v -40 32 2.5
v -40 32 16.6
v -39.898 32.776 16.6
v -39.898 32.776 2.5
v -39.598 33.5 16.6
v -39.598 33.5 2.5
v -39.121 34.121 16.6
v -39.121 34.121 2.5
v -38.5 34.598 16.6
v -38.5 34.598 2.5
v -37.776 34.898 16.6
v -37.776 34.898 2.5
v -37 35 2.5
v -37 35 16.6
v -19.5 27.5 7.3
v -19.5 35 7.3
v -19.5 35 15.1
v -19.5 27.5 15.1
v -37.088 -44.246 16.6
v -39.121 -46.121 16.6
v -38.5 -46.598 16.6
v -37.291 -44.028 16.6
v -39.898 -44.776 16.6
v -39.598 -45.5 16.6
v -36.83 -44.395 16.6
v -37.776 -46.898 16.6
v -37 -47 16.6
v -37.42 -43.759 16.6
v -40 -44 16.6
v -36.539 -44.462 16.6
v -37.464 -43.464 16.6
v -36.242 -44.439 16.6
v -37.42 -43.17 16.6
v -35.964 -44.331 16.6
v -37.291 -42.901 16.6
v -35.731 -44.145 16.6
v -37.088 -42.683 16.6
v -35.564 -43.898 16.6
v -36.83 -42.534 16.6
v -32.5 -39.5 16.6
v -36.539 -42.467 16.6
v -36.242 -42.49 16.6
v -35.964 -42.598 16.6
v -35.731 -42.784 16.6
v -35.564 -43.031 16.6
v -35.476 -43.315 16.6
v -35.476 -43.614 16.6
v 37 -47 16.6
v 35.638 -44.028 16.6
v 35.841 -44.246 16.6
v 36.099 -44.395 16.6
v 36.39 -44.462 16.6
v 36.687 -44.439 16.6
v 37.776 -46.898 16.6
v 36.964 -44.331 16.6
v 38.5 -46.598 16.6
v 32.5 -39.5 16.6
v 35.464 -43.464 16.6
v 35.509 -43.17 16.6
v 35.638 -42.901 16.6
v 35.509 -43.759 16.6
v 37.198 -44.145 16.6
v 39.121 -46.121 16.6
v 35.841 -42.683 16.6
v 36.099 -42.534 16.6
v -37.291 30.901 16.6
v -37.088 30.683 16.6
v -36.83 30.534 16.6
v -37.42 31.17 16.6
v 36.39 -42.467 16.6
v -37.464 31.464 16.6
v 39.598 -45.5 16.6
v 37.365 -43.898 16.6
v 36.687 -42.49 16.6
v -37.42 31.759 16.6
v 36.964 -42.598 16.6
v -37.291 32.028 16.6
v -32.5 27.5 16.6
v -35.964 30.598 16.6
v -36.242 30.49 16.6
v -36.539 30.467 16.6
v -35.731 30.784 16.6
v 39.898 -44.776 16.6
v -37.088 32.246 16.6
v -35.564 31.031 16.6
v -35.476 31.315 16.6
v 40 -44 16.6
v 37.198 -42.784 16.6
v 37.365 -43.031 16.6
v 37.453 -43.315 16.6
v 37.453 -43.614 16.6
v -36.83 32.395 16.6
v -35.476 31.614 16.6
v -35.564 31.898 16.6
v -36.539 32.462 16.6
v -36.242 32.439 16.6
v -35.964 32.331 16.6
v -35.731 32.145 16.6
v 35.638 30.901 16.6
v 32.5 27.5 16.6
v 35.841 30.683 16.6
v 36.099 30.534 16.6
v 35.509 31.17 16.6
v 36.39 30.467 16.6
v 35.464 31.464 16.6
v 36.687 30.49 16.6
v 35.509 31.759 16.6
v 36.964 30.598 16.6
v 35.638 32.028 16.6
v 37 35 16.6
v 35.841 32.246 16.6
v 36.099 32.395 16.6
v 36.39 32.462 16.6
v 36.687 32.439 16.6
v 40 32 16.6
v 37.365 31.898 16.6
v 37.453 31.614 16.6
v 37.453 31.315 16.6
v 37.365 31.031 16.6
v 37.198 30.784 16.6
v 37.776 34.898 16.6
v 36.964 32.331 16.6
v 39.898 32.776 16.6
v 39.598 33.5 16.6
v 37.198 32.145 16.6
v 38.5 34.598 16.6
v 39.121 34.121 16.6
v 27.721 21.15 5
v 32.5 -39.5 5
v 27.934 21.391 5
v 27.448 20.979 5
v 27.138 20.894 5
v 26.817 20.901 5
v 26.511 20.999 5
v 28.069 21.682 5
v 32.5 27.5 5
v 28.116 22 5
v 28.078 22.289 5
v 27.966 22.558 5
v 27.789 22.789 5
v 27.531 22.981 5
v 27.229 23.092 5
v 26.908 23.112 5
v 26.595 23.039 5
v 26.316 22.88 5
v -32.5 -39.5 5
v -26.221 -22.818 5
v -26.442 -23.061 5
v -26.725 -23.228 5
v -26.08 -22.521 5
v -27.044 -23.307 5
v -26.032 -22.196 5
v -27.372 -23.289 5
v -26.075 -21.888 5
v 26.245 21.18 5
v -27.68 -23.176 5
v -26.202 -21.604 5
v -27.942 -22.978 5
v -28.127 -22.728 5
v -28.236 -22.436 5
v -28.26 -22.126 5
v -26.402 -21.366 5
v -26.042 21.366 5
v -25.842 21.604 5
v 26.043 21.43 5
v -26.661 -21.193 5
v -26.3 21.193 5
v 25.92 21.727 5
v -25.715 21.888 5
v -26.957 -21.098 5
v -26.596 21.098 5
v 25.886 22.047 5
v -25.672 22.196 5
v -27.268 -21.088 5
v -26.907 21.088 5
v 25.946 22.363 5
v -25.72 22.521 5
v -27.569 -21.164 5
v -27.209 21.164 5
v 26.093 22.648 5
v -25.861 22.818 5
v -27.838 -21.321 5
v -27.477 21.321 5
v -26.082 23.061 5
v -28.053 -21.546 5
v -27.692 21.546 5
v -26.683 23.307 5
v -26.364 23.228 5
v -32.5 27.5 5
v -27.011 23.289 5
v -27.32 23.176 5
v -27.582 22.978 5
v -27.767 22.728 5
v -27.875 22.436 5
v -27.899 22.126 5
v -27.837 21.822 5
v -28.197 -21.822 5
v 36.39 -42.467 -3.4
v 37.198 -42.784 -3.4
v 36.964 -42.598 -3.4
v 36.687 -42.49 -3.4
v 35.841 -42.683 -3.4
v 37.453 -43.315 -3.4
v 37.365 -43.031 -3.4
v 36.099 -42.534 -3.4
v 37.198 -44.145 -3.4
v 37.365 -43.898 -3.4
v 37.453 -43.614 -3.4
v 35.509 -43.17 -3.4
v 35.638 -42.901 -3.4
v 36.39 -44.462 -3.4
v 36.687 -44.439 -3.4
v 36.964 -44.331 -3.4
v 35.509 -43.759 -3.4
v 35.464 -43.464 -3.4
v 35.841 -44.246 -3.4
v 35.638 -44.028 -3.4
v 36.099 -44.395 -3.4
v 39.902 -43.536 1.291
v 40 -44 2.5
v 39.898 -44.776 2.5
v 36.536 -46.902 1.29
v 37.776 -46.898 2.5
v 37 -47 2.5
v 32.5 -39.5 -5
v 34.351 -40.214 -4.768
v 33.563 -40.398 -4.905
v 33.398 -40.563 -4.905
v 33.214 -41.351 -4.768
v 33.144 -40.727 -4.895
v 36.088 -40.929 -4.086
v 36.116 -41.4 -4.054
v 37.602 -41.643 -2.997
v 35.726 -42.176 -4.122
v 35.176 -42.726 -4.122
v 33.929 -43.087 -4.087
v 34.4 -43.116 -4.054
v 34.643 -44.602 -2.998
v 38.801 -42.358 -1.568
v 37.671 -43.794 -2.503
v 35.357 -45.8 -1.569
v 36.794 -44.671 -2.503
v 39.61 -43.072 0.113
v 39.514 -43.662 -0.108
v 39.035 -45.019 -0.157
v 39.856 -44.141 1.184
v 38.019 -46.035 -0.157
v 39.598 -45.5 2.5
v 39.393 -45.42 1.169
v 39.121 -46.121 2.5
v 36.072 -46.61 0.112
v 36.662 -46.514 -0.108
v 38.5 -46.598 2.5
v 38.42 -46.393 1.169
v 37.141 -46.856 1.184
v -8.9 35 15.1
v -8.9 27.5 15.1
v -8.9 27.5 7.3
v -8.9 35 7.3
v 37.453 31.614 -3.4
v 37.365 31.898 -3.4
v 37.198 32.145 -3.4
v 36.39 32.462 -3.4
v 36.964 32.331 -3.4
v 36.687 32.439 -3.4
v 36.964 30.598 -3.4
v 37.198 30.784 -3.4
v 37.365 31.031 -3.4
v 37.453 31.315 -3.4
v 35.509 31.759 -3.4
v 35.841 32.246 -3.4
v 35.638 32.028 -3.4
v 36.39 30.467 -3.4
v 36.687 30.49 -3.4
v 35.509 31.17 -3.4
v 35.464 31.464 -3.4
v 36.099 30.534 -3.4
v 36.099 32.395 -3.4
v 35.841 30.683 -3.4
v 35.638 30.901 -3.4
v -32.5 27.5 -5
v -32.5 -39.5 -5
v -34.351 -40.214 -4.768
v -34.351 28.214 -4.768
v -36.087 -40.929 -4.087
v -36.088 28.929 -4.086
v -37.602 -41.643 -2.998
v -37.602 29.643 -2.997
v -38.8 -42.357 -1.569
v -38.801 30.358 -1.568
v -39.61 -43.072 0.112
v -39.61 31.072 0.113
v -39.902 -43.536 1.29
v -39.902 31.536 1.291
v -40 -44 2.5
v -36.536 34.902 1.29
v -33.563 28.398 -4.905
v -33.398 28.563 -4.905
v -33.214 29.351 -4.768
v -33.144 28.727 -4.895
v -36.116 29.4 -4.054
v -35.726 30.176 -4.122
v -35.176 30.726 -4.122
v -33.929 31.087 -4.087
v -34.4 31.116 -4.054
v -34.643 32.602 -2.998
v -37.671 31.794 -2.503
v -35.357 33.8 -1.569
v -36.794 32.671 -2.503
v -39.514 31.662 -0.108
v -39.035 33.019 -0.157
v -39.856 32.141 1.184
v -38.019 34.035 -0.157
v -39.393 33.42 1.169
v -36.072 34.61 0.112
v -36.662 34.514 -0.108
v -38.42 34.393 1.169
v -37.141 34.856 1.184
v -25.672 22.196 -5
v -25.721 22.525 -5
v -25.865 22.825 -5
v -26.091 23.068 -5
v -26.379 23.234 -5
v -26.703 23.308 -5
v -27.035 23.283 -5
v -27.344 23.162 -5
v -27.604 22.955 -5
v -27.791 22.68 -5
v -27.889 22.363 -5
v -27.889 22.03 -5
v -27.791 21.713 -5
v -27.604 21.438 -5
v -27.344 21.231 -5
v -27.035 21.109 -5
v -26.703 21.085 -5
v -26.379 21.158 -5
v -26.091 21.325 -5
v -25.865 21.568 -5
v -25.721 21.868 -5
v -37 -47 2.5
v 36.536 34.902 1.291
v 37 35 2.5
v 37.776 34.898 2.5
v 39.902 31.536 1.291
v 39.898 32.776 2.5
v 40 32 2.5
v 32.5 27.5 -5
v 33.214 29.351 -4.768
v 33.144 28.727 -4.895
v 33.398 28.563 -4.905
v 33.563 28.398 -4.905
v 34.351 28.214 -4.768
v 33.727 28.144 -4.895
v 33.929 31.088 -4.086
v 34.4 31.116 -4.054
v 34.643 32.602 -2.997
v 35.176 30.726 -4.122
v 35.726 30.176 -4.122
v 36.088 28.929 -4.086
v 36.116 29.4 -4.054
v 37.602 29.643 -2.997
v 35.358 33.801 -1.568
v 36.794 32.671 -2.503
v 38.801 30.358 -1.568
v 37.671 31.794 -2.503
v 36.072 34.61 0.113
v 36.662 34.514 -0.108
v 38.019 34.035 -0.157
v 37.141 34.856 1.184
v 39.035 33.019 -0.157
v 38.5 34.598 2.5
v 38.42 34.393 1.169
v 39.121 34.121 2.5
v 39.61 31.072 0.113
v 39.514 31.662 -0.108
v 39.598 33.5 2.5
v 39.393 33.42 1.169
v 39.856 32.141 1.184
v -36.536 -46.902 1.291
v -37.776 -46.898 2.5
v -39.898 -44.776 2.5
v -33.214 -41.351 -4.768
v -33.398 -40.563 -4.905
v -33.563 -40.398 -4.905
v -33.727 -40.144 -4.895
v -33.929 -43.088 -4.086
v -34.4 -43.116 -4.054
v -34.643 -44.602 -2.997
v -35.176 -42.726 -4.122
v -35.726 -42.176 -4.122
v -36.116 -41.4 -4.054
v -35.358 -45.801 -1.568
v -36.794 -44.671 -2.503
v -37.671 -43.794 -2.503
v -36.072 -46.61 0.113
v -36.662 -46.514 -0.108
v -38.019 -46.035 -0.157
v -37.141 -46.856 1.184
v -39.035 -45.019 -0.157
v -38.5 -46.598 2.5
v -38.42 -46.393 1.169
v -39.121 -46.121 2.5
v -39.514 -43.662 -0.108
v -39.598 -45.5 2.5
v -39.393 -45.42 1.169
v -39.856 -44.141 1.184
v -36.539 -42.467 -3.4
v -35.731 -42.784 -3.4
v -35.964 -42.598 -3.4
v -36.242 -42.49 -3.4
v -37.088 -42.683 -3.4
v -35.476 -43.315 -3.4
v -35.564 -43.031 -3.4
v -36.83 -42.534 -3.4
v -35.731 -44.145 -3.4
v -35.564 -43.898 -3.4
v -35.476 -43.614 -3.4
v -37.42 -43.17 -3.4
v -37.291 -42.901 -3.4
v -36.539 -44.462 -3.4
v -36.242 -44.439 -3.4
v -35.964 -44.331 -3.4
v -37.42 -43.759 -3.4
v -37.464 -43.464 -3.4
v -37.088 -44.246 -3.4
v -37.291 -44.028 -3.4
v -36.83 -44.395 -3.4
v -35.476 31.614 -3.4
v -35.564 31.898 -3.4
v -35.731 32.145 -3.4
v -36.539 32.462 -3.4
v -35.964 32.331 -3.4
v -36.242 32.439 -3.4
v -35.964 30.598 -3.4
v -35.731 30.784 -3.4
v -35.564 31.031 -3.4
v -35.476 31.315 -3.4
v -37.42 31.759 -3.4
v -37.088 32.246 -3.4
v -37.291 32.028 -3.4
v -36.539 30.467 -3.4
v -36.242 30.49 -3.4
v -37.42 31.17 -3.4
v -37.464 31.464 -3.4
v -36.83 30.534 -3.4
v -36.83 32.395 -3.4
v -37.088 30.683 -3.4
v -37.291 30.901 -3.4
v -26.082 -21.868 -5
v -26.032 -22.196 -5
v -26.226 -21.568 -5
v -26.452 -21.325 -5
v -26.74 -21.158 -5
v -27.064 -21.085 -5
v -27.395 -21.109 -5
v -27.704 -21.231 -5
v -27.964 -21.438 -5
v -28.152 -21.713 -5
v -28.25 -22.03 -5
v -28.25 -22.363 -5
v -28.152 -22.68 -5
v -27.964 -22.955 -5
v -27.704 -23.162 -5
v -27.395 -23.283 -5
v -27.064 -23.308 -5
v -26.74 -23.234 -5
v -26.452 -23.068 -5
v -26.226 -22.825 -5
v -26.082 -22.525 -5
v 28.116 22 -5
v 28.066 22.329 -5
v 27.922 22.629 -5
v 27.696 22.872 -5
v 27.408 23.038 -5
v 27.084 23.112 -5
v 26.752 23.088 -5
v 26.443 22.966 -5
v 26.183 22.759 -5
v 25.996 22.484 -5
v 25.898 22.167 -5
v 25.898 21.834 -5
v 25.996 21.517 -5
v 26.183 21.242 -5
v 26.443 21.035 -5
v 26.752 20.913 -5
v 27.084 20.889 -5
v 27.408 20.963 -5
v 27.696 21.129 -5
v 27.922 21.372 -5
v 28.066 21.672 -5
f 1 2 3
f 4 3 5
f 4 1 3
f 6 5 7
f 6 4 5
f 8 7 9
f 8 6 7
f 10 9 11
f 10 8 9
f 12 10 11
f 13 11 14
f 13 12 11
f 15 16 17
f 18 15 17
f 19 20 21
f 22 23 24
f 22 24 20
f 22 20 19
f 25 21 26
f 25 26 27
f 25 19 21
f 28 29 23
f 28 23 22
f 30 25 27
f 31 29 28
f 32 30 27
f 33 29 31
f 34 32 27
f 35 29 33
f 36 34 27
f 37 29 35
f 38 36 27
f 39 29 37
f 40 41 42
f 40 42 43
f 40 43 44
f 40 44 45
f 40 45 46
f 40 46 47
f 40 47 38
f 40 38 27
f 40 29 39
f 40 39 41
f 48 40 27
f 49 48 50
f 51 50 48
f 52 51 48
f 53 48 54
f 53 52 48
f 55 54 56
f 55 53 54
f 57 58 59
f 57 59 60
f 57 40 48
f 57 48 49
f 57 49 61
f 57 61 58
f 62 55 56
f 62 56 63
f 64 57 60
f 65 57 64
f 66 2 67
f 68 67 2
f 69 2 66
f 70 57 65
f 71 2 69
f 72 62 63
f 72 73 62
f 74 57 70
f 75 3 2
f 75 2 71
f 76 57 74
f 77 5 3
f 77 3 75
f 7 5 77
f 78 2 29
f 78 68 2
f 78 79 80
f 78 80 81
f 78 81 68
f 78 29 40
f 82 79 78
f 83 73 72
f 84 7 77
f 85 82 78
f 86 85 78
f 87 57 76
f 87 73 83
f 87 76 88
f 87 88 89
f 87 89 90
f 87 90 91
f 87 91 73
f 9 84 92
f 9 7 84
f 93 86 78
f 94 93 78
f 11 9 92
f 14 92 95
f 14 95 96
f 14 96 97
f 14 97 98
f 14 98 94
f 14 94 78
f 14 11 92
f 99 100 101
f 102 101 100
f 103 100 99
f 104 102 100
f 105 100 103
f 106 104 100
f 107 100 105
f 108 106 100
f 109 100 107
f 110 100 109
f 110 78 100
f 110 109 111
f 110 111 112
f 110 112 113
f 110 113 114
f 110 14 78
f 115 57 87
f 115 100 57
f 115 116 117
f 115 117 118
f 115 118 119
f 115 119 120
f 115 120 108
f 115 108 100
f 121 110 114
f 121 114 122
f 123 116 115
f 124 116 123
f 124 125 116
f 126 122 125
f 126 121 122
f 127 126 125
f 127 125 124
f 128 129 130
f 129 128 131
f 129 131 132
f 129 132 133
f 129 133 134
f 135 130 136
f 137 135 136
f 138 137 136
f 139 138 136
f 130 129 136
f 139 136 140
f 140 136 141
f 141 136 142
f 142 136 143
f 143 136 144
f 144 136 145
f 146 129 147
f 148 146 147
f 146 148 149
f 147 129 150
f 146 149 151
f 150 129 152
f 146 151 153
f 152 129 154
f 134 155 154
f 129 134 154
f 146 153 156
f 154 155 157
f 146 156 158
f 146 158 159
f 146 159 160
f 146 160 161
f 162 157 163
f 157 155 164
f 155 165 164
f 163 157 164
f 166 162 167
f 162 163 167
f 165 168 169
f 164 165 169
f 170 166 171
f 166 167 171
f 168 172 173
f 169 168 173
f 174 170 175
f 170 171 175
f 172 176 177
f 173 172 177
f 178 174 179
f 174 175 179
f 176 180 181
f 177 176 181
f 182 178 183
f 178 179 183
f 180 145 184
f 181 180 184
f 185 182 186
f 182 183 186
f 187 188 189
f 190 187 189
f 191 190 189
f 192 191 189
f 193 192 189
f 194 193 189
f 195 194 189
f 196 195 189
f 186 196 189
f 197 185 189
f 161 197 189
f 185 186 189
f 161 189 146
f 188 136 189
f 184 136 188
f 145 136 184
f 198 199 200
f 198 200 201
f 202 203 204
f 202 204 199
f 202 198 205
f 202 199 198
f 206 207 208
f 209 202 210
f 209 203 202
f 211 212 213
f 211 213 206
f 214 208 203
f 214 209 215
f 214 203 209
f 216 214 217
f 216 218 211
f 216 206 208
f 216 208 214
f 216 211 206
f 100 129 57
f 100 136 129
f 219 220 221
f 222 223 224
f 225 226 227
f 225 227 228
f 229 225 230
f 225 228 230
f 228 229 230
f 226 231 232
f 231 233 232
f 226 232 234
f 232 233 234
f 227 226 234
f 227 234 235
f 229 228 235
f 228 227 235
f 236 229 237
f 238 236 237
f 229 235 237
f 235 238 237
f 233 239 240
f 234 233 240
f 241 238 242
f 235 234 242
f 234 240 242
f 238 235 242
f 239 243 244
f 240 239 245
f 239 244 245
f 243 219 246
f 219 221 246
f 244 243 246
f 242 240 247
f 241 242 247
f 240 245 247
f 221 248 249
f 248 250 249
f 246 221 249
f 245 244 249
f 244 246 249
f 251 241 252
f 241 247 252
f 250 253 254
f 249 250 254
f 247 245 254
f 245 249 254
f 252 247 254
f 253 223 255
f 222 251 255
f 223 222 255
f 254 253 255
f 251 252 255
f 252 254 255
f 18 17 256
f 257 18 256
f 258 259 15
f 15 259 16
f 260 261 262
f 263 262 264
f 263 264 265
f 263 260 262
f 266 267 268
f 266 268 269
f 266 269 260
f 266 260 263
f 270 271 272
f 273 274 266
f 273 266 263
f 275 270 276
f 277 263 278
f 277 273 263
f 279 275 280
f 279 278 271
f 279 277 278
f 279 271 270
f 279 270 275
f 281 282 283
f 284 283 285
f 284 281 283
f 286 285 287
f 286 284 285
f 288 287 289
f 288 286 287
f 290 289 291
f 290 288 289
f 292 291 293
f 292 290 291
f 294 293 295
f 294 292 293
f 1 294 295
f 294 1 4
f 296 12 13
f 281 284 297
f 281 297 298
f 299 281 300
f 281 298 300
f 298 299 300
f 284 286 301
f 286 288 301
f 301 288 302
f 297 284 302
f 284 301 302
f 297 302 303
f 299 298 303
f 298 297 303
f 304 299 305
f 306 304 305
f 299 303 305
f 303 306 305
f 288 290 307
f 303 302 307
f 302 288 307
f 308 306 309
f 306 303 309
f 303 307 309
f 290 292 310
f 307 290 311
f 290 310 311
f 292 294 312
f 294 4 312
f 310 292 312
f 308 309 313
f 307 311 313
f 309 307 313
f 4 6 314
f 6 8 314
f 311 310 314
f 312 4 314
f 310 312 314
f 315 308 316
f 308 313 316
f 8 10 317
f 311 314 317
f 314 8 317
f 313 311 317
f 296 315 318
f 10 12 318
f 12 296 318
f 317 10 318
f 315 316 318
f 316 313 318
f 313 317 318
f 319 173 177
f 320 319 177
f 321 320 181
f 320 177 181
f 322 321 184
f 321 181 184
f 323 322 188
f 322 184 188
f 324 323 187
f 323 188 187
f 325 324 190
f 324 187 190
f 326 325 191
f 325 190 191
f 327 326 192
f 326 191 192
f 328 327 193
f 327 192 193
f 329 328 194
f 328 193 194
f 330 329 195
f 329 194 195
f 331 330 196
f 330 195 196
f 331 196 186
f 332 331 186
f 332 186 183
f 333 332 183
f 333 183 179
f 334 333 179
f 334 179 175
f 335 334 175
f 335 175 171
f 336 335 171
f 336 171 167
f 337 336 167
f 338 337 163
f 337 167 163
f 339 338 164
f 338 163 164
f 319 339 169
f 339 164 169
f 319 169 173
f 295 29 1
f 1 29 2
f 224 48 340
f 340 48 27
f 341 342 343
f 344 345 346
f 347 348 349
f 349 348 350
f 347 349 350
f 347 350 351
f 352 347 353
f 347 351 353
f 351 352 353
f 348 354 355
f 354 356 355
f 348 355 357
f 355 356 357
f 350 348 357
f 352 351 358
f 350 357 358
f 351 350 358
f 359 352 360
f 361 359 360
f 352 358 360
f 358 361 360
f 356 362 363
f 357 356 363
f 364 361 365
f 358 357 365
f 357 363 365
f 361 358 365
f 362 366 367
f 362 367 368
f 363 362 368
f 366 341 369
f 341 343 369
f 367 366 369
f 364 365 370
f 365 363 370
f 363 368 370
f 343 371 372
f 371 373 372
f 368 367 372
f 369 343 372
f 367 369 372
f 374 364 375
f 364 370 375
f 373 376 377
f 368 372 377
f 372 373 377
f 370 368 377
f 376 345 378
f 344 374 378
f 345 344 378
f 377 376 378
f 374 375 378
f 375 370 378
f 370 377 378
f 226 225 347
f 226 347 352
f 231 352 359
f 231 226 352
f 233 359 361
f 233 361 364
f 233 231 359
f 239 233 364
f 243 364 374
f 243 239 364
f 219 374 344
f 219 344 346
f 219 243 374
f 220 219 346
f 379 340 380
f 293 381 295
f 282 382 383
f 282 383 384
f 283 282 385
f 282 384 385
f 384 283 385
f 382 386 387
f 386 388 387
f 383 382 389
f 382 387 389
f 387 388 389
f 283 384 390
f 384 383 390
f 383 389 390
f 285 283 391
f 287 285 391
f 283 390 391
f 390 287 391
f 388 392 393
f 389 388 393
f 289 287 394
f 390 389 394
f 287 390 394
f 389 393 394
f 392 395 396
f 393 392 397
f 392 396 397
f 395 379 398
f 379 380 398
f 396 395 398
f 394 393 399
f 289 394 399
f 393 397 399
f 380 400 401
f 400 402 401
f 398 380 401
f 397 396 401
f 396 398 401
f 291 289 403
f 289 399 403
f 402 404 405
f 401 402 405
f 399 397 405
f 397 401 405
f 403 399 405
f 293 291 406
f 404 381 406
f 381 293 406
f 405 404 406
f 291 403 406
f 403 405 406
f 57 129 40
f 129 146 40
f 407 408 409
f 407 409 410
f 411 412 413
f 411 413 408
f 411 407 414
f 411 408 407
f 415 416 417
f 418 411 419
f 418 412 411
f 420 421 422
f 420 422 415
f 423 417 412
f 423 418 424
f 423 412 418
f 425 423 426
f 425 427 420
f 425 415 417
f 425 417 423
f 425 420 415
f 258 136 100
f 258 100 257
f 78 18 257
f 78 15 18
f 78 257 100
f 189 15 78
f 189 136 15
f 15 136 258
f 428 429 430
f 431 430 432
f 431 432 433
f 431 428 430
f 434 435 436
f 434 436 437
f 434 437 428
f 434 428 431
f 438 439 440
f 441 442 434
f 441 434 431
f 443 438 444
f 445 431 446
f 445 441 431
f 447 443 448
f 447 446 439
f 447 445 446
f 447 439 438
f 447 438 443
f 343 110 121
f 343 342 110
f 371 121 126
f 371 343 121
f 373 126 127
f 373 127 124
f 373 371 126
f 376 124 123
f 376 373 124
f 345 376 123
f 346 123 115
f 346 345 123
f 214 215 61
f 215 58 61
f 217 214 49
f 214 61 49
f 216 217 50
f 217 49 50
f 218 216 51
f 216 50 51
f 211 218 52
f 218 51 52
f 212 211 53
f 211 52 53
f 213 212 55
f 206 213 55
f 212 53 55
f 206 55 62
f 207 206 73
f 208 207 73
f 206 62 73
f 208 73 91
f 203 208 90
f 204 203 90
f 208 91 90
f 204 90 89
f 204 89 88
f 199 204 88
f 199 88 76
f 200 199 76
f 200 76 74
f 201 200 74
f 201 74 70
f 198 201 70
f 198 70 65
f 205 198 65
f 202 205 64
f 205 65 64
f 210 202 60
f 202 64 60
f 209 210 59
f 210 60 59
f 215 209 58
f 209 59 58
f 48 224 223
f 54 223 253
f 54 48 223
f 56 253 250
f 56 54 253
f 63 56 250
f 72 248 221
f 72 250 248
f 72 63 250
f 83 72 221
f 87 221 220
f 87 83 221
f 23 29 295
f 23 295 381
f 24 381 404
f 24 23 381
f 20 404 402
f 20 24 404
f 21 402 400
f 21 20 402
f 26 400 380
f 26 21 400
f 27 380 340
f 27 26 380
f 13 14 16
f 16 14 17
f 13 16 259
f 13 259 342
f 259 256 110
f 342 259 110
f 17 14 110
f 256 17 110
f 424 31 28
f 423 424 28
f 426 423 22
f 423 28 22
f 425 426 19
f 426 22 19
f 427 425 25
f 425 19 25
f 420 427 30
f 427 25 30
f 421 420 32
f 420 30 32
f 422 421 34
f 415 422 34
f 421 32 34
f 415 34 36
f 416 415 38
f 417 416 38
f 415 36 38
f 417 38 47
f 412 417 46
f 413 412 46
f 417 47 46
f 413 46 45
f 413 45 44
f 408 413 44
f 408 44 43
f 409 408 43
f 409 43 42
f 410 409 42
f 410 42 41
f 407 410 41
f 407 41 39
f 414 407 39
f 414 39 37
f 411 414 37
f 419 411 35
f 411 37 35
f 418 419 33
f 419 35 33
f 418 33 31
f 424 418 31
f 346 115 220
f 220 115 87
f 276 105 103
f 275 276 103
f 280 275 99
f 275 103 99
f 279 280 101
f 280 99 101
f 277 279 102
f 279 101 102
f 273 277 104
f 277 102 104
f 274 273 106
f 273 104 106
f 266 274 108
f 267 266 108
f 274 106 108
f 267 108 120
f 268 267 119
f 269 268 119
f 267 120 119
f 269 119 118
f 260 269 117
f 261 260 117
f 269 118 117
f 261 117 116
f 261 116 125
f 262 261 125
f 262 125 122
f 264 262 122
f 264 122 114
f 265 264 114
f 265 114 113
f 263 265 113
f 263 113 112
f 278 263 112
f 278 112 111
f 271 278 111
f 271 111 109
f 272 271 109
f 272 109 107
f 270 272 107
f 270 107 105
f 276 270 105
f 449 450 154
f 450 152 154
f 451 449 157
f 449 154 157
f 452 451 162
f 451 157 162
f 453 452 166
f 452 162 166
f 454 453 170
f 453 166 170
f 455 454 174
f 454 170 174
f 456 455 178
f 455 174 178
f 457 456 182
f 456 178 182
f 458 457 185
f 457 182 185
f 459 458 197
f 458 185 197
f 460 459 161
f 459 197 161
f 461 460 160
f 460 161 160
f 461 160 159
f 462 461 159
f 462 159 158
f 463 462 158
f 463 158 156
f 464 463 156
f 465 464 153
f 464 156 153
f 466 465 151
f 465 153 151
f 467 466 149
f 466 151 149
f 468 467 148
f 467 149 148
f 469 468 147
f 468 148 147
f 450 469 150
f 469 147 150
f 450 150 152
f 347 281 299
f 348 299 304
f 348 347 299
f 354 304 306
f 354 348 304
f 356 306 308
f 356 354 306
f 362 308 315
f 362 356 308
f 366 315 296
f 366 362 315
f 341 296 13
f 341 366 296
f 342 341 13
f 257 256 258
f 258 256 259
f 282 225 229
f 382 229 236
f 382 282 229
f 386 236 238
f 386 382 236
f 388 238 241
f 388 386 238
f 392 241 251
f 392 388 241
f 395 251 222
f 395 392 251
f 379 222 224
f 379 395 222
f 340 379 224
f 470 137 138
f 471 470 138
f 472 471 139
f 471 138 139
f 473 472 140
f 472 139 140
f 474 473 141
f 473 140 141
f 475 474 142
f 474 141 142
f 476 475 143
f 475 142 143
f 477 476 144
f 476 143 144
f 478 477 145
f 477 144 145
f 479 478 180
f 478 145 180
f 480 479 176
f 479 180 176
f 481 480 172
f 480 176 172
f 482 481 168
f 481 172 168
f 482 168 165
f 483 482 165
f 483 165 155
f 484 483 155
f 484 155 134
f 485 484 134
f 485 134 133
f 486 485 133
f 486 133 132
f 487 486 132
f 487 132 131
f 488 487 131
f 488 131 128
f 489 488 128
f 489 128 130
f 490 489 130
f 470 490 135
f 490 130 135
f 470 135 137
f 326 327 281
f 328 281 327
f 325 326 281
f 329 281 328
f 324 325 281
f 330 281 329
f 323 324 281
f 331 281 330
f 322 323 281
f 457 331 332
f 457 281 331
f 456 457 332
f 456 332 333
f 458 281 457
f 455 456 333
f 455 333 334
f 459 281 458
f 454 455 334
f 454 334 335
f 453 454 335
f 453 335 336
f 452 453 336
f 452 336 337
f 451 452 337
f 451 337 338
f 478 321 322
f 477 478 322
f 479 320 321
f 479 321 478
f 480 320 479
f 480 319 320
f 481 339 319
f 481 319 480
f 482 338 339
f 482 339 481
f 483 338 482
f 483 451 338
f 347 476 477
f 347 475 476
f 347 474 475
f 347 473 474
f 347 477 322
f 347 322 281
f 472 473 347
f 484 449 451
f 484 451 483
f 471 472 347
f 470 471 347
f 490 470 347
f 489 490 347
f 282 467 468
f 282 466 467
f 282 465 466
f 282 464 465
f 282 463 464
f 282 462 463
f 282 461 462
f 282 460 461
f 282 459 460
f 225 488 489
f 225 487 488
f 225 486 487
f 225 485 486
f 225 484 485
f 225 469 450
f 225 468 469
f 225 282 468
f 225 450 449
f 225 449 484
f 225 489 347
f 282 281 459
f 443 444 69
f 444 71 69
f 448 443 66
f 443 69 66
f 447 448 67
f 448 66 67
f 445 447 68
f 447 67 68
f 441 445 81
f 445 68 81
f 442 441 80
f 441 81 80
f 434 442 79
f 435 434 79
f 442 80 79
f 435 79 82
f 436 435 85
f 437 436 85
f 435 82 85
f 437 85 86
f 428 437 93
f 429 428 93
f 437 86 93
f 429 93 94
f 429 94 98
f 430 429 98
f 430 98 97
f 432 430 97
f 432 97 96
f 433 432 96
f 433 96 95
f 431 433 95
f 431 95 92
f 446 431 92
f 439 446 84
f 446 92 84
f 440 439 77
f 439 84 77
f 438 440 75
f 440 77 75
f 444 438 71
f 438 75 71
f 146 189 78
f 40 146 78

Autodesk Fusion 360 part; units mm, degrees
sketch "Sketch1" plane through (0, 0, 0) normal (0, 0, 1) x (1, 0, 0)
  line L0 (30, -25) -> (-30, -25)
  line L1 (-30, -25) -> (-30, 25)
  line L2 (-30, 25) -> (30, 25)
  line L3 (30, 25) -> (30, -25)
  line L4 (30, -25) -> (-30, 25) construction
  line L5 (-30, -25) -> (30, 25) construction
  line L6 (-30, -25) -> (-27.147, -22.1964)
  line L7 (-30, -25) -> (-34, -25) construction
  circle A0 centre (-27.147, -22.1964) radius 1.115
  circle A1 centre (-27.147, -22.1964) radius 2.5
  line L8 (-29.6396, 25) -> (-26.7866, 22.1964)
  line L9 (-29.6396, 25) -> (-25.6396, 25) construction
  circle A2 centre (-26.7866, 22.1964) radius 1.115
  circle A3 centre (-26.7866, 22.1964) radius 2.5
  line L10 (30, 25) -> (27.0005, 22.0005)
  line L11 (30, 25) -> (25.758, 25) construction
  circle A4 centre (27.0005, 22.0005) radius 1.115
  circle A5 centre (27.0005, 22.0005) radius 2.5
  line L12 (30, -25) -> (30, -35)
  line L13 (30, -35) -> (40, -35)
  line L14 (40, -35) -> (-40, -35)
  line L15 (-40, -35) -> (-40, 35)
  line L16 (-40, 35) -> (40, 35)
  line L17 (40, 35) -> (40, -35)
  dimension "d1" = 60
  dimension "d2" = 50
  dimension "d3" = 135.5
  dimension "d4" = 4
  dimension "d5" = 2.23
  dimension "d6" = 5
  dimension "d7" = 44.5
  dimension "d8" = 4
  dimension "d9" = 2.23
  dimension "d10" = 5
  dimension "d11" = 45
  dimension "d12" = 4.242
  dimension "d13" = 2.23
  dimension "d14" = 5
  dimension "d17" = 10
  dimension "d18" = 10
  dimension "d19" = 80
  dimension "d20" = 70
extrude "Extrude1" add sketch "Sketch1" along normal blind 10 contours A5 | A3 | A1 | L0 L1 L2 L3
extrude "Extrude2" cut 1 faces at (9.9936, -8.452, 10) along direction (0, 0, -1) blind 5
extrude "Extrude3" add sketch "Sketch1" along normal blind 24 contours L13 L14 L15 L16 L17
extrude "Extrude4" add 1 faces at (-10, 31.6667, 24) along direction (0, 0, 1) blind 2.6
extrude "Extrude5" cut 1 faces at (30, 8.3333, 12.2) along direction (1, 0, 0) blind 2.5
extrude "Extrude6" cut 1 faces at (10.8333, 25, 19.4) along direction (0, 1, 0) blind 2.5
extrude "Extrude7" cut 1 faces at (11.6667, -25, 12.2) along direction (0, -1, 0) blind 2.5
extrude "Extrude8" cut 1 faces at (-30, -8.3333, 19.4) along direction (-1, 0, 0) blind 2.5
sketch "Sketch2" plane through (0, 0, 26.6) normal (0, 0, 1) x (-1, 0, 0)
  line L0 (-32.5, 27.5) -> (32.5, 27.5)
  line L1 (32.5, 27.5) -> (32.5, -27.5)
  line L2 (32.5, -27.5) -> (-32.5, -27.5)
  line L3 (-32.5, -27.5) -> (-32.5, 27.5)
  line L4 (-40, -35) -> (40, -35)
  line L5 (40, -35) -> (40, 35)
  line L6 (40, 35) -> (-40, 35)
  line L7 (-40, 35) -> (-40, -35)
sketch "Sketch3" plane through (0, 35, 0) normal (0, 1, 0) x (-1, 0, 0)
  line L0 (-40, 0) -> (40, 0)
  line L1 (40, 0) -> (40, 26.6)
  line L2 (40, 26.6) -> (-40, 26.6)
  line L3 (-40, 26.6) -> (-40, 0)
  line L4 (40, 10.1) -> (14.2, 10.1)
  line L5 (14.2, 26.6) -> (14.2, 10.1)
  line L6 (21.7, 15.1) -> (6.7, 15.1)
  line L7 (6.7, 15.1) -> (6.7, 5.1)
  line L8 (6.7, 5.1) -> (21.7, 5.1)
  line L9 (21.7, 5.1) -> (21.7, 15.1)
  line L10 (21.7, 15.1) -> (6.7, 5.1) construction
  line L11 (6.7, 15.1) -> (21.7, 5.1) construction
  point P0 (14.2, 10.1)
  dimension "d36" = 25.8
  dimension "d37" = 16.5
  dimension "d38" = 15
  dimension "d39" = 10
extrude "Extrude9" cut sketch "Sketch3" against normal blind 22 contours L4 L5 L6 L7 L8 L9 | L4 L5 L6 L9
extrude "Extrude10" add 1 faces at (-6.7, 32.5, 11.7667) along direction (-1, 0, 0) blind 2.2
extrude "Extrude11" add 1 faces at (-21.7, 32.5, 8.4333) along direction (1, 0, 0) blind 2.2
extrude "Extrude12" add 1 faces at (-12.4333, 32.5, 5.1) along direction (0, 0, 1) blind 2.2
extrude "Extrude13" cut sketch "Sketch2" against normal blind 5
extrude "Extrude14" cut 1 faces at (-10.8333, -27.5, 10.5333) along direction (0, -1, 0) blind 5
extrude "Extrude15" add 1 faces at (13.3333, -35, 7.2) along direction (0, -1, 0) blind 5
extrude "Extrude16" cut 1 faces at (-10.8333, -32.5, 10.5333) along direction (0, -1, 0) blind 7
extrude "Extrude17" add 1 faces at (13.3333, -40, 7.2) along direction (0, -1, 0) blind 7
extrude "Extrude18" cut 1 faces at (-37.5, 5.1667, 21.6) along direction (0, 0, -1) blind 5
sketch "Sketch4" plane through (0, 0, 0) normal (0, 0, -1) x (1, 0, 0)
  line L0 (-40, -35) -> (40, -35)
  line L1 (40, -35) -> (40, 47)
  line L2 (40, 47) -> (-40, 47)
  line L3 (-40, 47) -> (-40, -35)
  circle A0 centre (27.0005, -22.0005) radius 1.115
  circle A1 centre (-27.147, 22.1964) radius 1.115
  circle A2 centre (-26.7866, -22.1964) radius 1.115
sketch "Sketch5" plane through (0, 0, 16.6) normal (0, 0, 1) x (-1, 0, 0)
  line L0 (32.5, 39.5) -> (32.5, -27.5)
  line L1 (32.5, -27.5) -> (-32.5, -27.5)
  line L2 (-32.5, -27.5) -> (-32.5, 39.5)
  line L3 (-32.5, 39.5) -> (32.5, 39.5)
  line L4 (-40, 47) -> (-40, -35)
  line L5 (-40, -35) -> (40, -35)
  line L6 (40, -35) -> (40, 47)
  line L7 (40, 47) -> (-40, 47)
  line L8 (40, 47) -> (36.4645, 43.4645)
  line L9 (40, 47) -> (35, 47) construction
  circle A0 centre (36.4645, 43.4645) radius 1
  line L10 (-40, 47) -> (-36.4645, 43.4645)
  line L11 (-40, 47) -> (-35, 47) construction
  circle A1 centre (-36.4645, 43.4645) radius 1
  line L12 (-40, -35) -> (-36.4645, -31.4645)
  line L13 (-40, -35) -> (-35, -35) construction
  circle A2 centre (-36.4645, -31.4645) radius 1
  line L14 (40, -35) -> (36.4645, -31.4645)
  line L15 (40, -35) -> (35, -35) construction
  circle A3 centre (36.4645, -31.4645) radius 1
  dimension "d60" = 45
  dimension "d61" = 5
  dimension "d62" = 2
  dimension "d63" = 5
  dimension "d64" = 45
  dimension "d65" = 2
  dimension "d66" = 5
  dimension "d67" = 45
  dimension "d68" = 2
  dimension "d69" = 45
  dimension "d70" = 5
  dimension "d71" = 2
extrude "Extrude19" add sketch "Sketch4" along normal blind 5
extrude "Extrude20" cut sketch "Sketch5" against normal blind 20 contours A2 | A3 | A0 | A1
fillet "Fillet1" radius 3 4 edges at (40, -47, 5.8) (-40, -47, 5.8) (-40, 35, 5.8) (40, 35, 5.8)
fillet "Fillet2" radius 7.5 8 edges at (39.1213, 34.1213, -5) (40, -6, -5) (39.1213, -46.1213, -5) (0, -47, -5) (-39.1213, -46.1213, -5) (-40, -6, -5) (-39.1213, 34.1213, -5) (0, 35, -5)
equation "d23 = 17 mm + 5 mm + 2 mm"
equation "d36 = 25 mm + 0.8 mm"
equation "d37 = 15 mm + 1.5 mm"
